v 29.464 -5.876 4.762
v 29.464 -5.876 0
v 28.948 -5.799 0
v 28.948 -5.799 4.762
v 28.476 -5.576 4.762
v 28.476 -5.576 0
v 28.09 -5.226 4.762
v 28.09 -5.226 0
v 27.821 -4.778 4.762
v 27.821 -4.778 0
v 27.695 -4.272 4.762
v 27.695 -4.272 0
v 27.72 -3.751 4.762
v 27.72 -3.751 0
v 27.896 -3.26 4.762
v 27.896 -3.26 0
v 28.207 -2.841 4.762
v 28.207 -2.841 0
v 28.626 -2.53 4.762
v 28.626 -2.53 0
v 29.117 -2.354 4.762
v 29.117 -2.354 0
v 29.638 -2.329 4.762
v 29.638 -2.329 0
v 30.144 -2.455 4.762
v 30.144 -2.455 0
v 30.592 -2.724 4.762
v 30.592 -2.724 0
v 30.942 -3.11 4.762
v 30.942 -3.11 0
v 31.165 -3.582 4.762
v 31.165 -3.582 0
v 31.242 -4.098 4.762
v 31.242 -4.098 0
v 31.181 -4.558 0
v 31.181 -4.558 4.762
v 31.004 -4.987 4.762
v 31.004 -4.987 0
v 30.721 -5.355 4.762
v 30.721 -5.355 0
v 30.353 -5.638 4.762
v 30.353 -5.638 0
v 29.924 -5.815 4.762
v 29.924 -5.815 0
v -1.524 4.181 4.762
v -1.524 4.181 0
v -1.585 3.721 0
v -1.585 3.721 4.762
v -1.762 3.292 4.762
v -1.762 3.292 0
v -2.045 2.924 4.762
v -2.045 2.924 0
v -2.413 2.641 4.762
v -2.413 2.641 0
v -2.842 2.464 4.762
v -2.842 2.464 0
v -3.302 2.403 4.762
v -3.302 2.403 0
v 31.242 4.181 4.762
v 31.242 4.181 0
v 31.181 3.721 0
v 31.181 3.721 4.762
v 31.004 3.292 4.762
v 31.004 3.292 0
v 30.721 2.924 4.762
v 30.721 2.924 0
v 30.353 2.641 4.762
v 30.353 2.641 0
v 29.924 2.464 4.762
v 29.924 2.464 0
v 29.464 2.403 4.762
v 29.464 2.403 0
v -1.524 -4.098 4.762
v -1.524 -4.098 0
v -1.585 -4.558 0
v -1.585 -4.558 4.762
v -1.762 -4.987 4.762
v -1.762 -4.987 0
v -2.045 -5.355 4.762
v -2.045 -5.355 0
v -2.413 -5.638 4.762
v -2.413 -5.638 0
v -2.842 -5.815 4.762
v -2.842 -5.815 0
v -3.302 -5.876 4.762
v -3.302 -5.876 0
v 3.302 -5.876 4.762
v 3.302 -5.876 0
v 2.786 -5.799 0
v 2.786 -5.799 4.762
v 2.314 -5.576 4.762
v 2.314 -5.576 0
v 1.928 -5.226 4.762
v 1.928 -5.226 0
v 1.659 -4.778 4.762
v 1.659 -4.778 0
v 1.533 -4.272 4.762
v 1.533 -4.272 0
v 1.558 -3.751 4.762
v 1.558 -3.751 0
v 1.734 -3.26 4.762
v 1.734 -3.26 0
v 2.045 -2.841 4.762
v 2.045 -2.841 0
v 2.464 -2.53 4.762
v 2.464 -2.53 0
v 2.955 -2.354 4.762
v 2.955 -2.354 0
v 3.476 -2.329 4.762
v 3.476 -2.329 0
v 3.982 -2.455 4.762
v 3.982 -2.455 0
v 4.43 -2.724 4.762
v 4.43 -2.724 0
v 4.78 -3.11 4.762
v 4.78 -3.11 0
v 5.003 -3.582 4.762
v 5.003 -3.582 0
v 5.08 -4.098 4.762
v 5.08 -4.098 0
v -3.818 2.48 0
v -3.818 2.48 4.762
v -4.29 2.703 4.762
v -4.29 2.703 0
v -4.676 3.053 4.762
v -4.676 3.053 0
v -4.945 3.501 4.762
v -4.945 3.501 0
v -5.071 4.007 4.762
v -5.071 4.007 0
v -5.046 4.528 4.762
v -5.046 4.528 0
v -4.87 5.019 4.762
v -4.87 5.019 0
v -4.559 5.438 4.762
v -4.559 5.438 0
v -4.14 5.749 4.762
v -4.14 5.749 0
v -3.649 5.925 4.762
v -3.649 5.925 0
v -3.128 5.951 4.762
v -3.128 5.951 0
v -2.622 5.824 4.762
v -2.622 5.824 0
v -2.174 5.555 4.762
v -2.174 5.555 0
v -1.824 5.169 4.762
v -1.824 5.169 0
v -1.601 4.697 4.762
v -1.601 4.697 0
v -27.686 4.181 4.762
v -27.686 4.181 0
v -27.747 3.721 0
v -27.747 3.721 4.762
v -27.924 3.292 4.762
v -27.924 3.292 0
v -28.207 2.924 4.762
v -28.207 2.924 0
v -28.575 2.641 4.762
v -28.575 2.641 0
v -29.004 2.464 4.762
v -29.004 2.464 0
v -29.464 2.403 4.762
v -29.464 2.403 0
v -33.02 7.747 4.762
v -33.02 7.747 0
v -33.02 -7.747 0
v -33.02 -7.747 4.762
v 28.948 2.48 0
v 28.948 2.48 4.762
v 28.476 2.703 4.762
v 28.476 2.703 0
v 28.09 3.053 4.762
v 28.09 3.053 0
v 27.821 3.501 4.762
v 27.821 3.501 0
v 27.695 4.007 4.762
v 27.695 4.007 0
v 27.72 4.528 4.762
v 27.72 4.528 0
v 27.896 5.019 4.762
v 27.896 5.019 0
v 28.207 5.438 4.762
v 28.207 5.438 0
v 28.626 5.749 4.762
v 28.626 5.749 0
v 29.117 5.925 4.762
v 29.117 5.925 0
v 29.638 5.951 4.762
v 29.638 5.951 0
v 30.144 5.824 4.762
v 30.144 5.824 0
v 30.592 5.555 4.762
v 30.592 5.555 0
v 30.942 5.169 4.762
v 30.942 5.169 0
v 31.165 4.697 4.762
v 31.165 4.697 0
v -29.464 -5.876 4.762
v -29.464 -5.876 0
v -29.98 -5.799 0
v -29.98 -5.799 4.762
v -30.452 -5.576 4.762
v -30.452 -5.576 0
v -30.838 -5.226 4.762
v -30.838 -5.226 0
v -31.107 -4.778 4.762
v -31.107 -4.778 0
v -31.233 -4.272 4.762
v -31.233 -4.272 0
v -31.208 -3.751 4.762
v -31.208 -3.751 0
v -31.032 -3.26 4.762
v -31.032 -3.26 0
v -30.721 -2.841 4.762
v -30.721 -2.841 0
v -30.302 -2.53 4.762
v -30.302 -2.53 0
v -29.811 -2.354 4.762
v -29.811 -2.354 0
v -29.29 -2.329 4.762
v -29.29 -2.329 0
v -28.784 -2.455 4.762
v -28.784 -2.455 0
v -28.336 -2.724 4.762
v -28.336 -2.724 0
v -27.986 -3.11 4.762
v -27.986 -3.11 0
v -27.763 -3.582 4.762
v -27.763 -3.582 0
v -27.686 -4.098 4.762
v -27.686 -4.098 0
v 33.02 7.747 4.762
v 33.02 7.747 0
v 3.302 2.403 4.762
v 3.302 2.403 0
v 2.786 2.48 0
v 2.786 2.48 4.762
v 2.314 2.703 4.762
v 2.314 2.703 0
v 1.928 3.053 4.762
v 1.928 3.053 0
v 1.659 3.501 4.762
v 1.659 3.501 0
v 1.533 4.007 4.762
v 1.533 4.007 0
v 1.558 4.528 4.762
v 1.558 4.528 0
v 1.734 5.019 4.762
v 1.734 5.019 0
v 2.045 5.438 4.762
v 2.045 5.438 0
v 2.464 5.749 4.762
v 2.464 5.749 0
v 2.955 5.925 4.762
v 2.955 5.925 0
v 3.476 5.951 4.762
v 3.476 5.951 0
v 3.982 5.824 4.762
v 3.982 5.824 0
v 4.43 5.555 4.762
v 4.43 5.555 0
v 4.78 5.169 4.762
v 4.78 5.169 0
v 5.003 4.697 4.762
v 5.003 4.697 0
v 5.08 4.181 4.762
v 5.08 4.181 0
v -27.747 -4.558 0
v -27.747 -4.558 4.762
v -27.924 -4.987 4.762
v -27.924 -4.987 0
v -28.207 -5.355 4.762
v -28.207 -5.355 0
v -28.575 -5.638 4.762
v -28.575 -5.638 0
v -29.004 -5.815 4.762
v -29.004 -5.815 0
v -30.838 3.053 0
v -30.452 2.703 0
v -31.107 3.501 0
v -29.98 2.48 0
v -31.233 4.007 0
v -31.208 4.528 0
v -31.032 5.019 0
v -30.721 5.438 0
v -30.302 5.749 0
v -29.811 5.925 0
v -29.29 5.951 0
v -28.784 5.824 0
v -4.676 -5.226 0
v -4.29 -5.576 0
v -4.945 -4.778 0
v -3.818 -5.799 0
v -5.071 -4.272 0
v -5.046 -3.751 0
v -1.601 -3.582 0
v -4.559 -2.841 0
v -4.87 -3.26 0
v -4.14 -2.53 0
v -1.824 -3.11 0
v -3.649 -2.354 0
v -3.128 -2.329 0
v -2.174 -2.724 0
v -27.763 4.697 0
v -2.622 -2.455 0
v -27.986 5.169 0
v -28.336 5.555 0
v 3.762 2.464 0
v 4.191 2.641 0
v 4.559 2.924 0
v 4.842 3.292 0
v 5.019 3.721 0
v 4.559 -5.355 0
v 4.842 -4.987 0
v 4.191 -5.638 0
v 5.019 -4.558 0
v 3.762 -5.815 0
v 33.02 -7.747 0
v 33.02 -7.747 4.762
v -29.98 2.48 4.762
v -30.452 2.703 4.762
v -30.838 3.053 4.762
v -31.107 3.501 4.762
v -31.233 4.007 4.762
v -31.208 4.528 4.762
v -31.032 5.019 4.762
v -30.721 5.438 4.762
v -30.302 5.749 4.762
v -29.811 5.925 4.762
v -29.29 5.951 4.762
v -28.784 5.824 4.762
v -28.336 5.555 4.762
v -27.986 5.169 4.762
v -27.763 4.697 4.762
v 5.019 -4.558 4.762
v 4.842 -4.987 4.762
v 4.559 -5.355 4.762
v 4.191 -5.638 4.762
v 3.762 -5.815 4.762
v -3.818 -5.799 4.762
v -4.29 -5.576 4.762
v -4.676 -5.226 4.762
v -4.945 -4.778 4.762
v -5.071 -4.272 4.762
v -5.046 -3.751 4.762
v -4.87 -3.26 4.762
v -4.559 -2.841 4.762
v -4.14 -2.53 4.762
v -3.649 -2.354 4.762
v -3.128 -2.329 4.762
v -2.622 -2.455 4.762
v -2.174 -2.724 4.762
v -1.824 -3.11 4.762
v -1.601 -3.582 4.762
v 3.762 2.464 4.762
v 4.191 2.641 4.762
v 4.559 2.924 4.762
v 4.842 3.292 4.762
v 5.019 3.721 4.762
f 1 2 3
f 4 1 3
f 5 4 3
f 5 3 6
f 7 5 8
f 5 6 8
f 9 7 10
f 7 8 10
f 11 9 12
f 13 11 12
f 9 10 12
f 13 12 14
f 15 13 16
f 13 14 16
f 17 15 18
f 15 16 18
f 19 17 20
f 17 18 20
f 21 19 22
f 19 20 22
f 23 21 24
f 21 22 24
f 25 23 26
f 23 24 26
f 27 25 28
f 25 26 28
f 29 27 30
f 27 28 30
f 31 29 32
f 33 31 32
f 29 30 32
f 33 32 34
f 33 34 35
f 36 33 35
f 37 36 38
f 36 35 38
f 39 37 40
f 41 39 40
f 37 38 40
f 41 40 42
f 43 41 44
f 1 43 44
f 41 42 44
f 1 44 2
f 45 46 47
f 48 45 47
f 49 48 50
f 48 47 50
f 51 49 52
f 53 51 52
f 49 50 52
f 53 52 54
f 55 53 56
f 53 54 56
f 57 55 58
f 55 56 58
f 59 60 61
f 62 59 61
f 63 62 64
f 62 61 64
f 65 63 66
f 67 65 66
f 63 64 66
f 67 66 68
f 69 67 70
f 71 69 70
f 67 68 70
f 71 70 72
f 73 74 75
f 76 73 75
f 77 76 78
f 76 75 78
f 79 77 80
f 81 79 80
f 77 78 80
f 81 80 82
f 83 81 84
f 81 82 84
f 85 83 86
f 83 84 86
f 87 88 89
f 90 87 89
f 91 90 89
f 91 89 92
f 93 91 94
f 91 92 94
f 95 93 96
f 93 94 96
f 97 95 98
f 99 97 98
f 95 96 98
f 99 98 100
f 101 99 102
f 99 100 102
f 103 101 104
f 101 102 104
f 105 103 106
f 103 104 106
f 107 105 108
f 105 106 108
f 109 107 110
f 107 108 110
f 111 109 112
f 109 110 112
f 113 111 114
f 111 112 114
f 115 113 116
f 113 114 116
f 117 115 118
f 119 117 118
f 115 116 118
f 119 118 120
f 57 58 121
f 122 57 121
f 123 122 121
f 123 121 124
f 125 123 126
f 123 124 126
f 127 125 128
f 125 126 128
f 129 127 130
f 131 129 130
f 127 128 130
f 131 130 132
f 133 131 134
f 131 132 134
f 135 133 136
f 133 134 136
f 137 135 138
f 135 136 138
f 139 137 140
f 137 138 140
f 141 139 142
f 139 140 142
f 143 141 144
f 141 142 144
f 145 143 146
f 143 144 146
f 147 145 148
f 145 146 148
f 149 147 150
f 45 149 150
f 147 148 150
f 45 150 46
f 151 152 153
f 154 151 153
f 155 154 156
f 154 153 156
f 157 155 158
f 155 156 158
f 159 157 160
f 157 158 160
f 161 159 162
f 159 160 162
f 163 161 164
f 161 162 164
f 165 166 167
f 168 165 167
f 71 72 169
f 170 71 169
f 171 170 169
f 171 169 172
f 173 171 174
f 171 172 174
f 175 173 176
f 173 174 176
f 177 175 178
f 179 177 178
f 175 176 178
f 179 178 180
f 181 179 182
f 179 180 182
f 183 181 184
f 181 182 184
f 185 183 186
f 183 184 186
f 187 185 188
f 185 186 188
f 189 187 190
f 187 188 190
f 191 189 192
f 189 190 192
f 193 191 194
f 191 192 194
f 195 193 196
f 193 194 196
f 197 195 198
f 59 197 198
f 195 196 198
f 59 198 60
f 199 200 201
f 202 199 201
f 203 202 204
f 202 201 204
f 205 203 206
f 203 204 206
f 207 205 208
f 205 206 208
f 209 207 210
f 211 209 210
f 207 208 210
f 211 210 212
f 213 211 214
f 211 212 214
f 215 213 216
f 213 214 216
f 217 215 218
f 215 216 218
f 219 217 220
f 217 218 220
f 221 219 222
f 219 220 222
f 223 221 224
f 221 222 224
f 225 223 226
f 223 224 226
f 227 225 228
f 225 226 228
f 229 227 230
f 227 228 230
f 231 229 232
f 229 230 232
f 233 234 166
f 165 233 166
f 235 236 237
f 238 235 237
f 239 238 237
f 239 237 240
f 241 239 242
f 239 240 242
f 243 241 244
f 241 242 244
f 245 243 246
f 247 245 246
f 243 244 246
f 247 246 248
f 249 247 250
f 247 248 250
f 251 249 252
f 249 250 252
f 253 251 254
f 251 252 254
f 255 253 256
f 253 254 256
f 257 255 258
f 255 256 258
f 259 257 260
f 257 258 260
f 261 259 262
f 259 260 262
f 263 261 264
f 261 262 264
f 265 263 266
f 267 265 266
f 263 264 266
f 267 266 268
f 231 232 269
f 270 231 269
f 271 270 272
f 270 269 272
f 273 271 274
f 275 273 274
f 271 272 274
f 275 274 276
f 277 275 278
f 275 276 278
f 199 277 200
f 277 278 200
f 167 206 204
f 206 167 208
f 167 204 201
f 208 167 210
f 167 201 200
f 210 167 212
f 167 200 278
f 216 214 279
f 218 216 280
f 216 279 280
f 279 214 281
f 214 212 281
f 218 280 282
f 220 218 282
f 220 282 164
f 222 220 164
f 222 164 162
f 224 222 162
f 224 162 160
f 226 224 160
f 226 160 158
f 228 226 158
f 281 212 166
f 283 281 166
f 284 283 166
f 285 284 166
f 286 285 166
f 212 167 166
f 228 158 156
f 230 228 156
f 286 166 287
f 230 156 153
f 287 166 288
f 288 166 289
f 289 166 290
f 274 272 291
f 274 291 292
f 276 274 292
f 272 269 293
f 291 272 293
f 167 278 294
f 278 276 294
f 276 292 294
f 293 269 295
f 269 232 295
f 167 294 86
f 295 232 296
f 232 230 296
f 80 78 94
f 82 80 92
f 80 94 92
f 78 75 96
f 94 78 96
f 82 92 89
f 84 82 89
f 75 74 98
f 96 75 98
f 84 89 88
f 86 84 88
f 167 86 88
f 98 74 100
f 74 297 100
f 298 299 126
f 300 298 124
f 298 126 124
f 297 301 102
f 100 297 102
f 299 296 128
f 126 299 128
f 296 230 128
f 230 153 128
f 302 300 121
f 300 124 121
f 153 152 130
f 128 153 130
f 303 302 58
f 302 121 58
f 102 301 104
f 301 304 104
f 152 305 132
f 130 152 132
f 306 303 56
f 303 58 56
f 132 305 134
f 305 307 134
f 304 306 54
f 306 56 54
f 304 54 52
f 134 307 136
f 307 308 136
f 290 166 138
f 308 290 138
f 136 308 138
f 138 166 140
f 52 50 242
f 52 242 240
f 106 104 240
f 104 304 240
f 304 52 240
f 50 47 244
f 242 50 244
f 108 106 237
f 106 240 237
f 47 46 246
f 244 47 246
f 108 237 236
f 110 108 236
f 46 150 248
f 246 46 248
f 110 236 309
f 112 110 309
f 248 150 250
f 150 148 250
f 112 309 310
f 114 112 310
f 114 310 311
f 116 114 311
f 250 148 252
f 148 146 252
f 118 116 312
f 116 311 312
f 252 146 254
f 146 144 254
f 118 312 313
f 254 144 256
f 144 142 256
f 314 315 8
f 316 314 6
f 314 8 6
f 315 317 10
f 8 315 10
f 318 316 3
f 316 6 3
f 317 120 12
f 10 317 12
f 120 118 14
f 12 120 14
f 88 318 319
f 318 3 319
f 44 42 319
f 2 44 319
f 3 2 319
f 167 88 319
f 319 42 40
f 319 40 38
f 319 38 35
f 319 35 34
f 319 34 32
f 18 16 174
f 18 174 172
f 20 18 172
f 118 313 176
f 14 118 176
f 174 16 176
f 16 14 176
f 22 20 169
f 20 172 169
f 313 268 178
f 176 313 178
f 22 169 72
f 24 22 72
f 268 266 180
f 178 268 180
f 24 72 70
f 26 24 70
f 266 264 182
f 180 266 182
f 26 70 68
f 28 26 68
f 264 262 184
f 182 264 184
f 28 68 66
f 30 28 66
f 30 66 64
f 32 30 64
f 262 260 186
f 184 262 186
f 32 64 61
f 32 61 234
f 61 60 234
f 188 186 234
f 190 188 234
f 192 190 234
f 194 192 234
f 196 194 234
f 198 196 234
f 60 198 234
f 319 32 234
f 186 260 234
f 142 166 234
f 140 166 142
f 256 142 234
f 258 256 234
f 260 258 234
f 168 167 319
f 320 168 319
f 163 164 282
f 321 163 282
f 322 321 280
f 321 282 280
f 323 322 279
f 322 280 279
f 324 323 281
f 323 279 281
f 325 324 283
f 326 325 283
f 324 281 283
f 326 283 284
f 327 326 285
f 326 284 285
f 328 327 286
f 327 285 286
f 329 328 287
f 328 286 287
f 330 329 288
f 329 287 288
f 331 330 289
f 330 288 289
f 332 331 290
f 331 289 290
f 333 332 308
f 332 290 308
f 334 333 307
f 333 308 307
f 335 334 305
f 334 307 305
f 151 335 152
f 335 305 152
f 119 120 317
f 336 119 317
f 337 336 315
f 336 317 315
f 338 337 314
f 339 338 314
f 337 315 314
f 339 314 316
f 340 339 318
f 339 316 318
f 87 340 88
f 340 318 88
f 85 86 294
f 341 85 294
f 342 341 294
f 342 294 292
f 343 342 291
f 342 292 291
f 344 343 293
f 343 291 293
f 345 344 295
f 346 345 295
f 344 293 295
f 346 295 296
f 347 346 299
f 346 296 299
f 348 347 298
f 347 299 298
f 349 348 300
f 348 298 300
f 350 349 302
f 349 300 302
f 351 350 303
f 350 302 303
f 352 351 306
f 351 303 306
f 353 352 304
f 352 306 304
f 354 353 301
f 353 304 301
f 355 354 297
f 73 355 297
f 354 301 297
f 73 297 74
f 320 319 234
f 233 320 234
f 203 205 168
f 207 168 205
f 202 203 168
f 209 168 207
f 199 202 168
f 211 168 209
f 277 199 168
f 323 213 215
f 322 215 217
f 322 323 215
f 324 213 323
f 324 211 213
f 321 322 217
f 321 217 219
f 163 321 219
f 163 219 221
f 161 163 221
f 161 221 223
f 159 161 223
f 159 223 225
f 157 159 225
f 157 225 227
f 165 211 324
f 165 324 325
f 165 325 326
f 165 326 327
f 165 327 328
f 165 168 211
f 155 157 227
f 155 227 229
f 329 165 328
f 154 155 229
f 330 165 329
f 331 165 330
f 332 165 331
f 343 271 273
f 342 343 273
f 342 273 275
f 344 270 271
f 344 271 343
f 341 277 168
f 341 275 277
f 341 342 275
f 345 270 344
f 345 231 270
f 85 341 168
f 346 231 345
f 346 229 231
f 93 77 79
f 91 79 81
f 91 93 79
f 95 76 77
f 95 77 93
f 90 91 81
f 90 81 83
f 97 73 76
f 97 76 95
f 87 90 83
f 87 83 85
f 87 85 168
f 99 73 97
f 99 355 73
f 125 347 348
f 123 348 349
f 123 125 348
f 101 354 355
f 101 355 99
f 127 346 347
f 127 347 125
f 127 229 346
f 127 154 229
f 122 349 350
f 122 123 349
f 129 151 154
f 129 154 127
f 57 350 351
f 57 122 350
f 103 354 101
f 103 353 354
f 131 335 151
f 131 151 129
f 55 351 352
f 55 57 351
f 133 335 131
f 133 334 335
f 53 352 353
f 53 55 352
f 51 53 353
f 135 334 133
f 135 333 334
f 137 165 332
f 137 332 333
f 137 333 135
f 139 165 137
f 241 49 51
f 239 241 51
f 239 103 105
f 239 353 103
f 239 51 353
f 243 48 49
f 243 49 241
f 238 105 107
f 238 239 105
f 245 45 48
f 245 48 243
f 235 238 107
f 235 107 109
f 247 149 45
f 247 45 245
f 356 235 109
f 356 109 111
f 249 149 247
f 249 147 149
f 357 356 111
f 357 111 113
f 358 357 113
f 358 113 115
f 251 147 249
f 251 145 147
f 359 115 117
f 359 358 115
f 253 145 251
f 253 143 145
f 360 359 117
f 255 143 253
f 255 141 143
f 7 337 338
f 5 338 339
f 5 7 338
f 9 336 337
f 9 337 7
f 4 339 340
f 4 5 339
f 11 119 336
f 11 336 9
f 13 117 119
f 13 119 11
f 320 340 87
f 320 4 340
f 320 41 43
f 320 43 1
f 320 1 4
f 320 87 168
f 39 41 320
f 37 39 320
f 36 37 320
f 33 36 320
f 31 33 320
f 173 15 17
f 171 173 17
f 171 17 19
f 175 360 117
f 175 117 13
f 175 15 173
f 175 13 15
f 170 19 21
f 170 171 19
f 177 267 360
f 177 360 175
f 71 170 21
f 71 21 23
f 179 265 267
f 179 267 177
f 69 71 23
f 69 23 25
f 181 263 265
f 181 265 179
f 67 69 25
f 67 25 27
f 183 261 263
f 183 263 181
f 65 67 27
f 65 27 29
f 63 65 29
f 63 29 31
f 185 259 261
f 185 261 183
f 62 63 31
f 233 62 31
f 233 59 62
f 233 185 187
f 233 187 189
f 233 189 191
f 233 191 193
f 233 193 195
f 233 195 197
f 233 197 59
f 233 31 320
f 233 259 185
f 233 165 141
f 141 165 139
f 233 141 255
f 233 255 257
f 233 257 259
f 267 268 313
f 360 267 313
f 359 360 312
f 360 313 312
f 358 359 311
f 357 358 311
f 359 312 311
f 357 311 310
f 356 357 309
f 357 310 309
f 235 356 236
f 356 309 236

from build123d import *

# Parameters (mm, degrees)
F1_DEPTH = 4.7625


# Not quite as in the source:
# - a length typed as a fraction of an inch, garbled in the dataset ("3 / 203.2 mm" for 3/8 in), is restored


with BuildPart() as f1:
    # F0 (on Top) → F1 (new body)
    with BuildSketch(Plane.XY):
        with BuildLine():
            Line((-3.302, 5.9590800321), (-3.302, 7.747))
            Line((-3.302, 7.747), (-29.464, 7.747))
            Line((-29.464, 7.747), (-29.464, 5.9590800321))
            ThreePointArc((-29.464, 5.9590800321), (-28.2067641431, 5.4383158891), (-27.686, 4.1810800321))
            ThreePointArc((-27.686, 4.1810800321), (-28.2067641431, 2.9238441752), (-29.464, 2.4030800321))
            Line((-29.464, 2.4030800321), (-29.464, -2.3199413316))
            ThreePointArc((-29.464, -2.3199413316), (-28.2067641431, -2.8407054746), (-27.686, -4.0979413316))
            ThreePointArc((-27.686, -4.0979413316), (-28.2067641431, -5.3551771885), (-29.464, -5.8759413316))
            Line((-29.464, -5.8759413316), (-29.464, -7.747))
            Line((-29.464, -7.747), (-3.302, -7.747))
            Line((-3.302, -7.747), (-3.302, -5.8759413316))
            ThreePointArc((-3.302, -5.8759413316), (-5.08, -4.0979413316), (-3.302, -2.3199413316))
            Line((-3.302, -2.3199413316), (-3.302, 2.4030800321))
            ThreePointArc((-3.302, 2.4030800321), (-5.08, 4.1810800321), (-3.302, 5.9590800321))
        make_face()
        with BuildLine():
            Line((-29.464, 5.9590800321), (-29.464, 7.747))
            Line((-29.464, 7.747), (-33.02, 7.747))
            Line((-33.02, 7.747), (-33.02, -7.747))
            Line((-33.02, -7.747), (-29.464, -7.747))
            Line((-29.464, -7.747), (-29.464, -5.8759413316))
            ThreePointArc((-29.464, -5.8759413316), (-31.242, -4.0979413316), (-29.464, -2.3199413316))
            Line((-29.464, -2.3199413316), (-29.464, 2.4030800321))
            ThreePointArc((-29.464, 2.4030800321), (-31.242, 4.1810800321), (-29.464, 5.9590800321))
        make_face()
        with BuildLine():
            Line((29.464, 5.9590800321), (29.464, 7.747))
            Line((29.464, 7.747), (3.302, 7.747))
            Line((3.302, 7.747), (3.302, 5.9590800321))
            ThreePointArc((3.302, 5.9590800321), (4.5592358569, 5.4383158891), (5.08, 4.1810800321))
            ThreePointArc((5.08, 4.1810800321), (4.5592358569, 2.9238441752), (3.302, 2.4030800321))
            Line((3.302, 2.4030800321), (3.302, -2.3199413316))
            ThreePointArc((3.302, -2.3199413316), (4.5592358569, -2.8407054746), (5.08, -4.0979413316))
            ThreePointArc((5.08, -4.0979413316), (4.5592358569, -5.3551771885), (3.302, -5.8759413316))
            Line((3.302, -5.8759413316), (3.302, -7.747))
            Line((3.302, -7.747), (29.464, -7.747))
            Line((29.464, -7.747), (29.464, -5.8759413316))
            ThreePointArc((29.464, -5.8759413316), (27.686, -4.0979413316), (29.464, -2.3199413316))
            Line((29.464, -2.3199413316), (29.464, 2.4030800321))
            ThreePointArc((29.464, 2.4030800321), (27.686, 4.1810800321), (29.464, 5.9590800321))
        make_face()
        with BuildLine():
            Line((33.02, -7.747), (33.02, 7.747))
            Line((33.02, 7.747), (29.464, 7.747))
            Line((29.464, 7.747), (29.464, 5.9590800321))
            ThreePointArc((29.464, 5.9590800321), (30.7212358569, 5.4383158891), (31.242, 4.1810800321))
            ThreePointArc((31.242, 4.1810800321), (30.7212358569, 2.9238441752), (29.464, 2.4030800321))
            Line((29.464, 2.4030800321), (29.464, -2.3199413316))
            ThreePointArc((29.464, -2.3199413316), (30.7212358569, -2.8407054746), (31.242, -4.0979413316))
            ThreePointArc((31.242, -4.0979413316), (30.7212358569, -5.3551771885), (29.464, -5.8759413316))
            Line((29.464, -5.8759413316), (29.464, -7.747))
            Line((29.464, -7.747), (33.02, -7.747))
        make_face()
        with BuildLine():
            Line((3.302, 5.9590800321), (3.302, 7.747))
            Line((3.302, 7.747), (-3.302, 7.747))
            Line((-3.302, 7.747), (-3.302, 5.9590800321))
            ThreePointArc((-3.302, 5.9590800321), (-2.0447641431, 5.4383158891), (-1.524, 4.1810800321))
            ThreePointArc((-1.524, 4.1810800321), (-2.0447641431, 2.9238441752), (-3.302, 2.4030800321))
            Line((-3.302, 2.4030800321), (-3.302, -2.3199413316))
            ThreePointArc((-3.302, -2.3199413316), (-2.0447641431, -2.8407054746), (-1.524, -4.0979413316))
            ThreePointArc((-1.524, -4.0979413316), (-2.0447641431, -5.3551771885), (-3.302, -5.8759413316))
            Line((-3.302, -5.8759413316), (-3.302, -7.747))
            Line((-3.302, -7.747), (3.302, -7.747))
            Line((3.302, -7.747), (3.302, -5.8759413316))
            ThreePointArc((3.302, -5.8759413316), (1.524, -4.0979413316), (3.302, -2.3199413316))
            Line((3.302, -2.3199413316), (3.302, 2.4030800321))
            ThreePointArc((3.302, 2.4030800321), (1.524, 4.1810800321), (3.302, 5.9590800321))
        make_face()
    extrude(amount=F1_DEPTH)


solid = f1.part
